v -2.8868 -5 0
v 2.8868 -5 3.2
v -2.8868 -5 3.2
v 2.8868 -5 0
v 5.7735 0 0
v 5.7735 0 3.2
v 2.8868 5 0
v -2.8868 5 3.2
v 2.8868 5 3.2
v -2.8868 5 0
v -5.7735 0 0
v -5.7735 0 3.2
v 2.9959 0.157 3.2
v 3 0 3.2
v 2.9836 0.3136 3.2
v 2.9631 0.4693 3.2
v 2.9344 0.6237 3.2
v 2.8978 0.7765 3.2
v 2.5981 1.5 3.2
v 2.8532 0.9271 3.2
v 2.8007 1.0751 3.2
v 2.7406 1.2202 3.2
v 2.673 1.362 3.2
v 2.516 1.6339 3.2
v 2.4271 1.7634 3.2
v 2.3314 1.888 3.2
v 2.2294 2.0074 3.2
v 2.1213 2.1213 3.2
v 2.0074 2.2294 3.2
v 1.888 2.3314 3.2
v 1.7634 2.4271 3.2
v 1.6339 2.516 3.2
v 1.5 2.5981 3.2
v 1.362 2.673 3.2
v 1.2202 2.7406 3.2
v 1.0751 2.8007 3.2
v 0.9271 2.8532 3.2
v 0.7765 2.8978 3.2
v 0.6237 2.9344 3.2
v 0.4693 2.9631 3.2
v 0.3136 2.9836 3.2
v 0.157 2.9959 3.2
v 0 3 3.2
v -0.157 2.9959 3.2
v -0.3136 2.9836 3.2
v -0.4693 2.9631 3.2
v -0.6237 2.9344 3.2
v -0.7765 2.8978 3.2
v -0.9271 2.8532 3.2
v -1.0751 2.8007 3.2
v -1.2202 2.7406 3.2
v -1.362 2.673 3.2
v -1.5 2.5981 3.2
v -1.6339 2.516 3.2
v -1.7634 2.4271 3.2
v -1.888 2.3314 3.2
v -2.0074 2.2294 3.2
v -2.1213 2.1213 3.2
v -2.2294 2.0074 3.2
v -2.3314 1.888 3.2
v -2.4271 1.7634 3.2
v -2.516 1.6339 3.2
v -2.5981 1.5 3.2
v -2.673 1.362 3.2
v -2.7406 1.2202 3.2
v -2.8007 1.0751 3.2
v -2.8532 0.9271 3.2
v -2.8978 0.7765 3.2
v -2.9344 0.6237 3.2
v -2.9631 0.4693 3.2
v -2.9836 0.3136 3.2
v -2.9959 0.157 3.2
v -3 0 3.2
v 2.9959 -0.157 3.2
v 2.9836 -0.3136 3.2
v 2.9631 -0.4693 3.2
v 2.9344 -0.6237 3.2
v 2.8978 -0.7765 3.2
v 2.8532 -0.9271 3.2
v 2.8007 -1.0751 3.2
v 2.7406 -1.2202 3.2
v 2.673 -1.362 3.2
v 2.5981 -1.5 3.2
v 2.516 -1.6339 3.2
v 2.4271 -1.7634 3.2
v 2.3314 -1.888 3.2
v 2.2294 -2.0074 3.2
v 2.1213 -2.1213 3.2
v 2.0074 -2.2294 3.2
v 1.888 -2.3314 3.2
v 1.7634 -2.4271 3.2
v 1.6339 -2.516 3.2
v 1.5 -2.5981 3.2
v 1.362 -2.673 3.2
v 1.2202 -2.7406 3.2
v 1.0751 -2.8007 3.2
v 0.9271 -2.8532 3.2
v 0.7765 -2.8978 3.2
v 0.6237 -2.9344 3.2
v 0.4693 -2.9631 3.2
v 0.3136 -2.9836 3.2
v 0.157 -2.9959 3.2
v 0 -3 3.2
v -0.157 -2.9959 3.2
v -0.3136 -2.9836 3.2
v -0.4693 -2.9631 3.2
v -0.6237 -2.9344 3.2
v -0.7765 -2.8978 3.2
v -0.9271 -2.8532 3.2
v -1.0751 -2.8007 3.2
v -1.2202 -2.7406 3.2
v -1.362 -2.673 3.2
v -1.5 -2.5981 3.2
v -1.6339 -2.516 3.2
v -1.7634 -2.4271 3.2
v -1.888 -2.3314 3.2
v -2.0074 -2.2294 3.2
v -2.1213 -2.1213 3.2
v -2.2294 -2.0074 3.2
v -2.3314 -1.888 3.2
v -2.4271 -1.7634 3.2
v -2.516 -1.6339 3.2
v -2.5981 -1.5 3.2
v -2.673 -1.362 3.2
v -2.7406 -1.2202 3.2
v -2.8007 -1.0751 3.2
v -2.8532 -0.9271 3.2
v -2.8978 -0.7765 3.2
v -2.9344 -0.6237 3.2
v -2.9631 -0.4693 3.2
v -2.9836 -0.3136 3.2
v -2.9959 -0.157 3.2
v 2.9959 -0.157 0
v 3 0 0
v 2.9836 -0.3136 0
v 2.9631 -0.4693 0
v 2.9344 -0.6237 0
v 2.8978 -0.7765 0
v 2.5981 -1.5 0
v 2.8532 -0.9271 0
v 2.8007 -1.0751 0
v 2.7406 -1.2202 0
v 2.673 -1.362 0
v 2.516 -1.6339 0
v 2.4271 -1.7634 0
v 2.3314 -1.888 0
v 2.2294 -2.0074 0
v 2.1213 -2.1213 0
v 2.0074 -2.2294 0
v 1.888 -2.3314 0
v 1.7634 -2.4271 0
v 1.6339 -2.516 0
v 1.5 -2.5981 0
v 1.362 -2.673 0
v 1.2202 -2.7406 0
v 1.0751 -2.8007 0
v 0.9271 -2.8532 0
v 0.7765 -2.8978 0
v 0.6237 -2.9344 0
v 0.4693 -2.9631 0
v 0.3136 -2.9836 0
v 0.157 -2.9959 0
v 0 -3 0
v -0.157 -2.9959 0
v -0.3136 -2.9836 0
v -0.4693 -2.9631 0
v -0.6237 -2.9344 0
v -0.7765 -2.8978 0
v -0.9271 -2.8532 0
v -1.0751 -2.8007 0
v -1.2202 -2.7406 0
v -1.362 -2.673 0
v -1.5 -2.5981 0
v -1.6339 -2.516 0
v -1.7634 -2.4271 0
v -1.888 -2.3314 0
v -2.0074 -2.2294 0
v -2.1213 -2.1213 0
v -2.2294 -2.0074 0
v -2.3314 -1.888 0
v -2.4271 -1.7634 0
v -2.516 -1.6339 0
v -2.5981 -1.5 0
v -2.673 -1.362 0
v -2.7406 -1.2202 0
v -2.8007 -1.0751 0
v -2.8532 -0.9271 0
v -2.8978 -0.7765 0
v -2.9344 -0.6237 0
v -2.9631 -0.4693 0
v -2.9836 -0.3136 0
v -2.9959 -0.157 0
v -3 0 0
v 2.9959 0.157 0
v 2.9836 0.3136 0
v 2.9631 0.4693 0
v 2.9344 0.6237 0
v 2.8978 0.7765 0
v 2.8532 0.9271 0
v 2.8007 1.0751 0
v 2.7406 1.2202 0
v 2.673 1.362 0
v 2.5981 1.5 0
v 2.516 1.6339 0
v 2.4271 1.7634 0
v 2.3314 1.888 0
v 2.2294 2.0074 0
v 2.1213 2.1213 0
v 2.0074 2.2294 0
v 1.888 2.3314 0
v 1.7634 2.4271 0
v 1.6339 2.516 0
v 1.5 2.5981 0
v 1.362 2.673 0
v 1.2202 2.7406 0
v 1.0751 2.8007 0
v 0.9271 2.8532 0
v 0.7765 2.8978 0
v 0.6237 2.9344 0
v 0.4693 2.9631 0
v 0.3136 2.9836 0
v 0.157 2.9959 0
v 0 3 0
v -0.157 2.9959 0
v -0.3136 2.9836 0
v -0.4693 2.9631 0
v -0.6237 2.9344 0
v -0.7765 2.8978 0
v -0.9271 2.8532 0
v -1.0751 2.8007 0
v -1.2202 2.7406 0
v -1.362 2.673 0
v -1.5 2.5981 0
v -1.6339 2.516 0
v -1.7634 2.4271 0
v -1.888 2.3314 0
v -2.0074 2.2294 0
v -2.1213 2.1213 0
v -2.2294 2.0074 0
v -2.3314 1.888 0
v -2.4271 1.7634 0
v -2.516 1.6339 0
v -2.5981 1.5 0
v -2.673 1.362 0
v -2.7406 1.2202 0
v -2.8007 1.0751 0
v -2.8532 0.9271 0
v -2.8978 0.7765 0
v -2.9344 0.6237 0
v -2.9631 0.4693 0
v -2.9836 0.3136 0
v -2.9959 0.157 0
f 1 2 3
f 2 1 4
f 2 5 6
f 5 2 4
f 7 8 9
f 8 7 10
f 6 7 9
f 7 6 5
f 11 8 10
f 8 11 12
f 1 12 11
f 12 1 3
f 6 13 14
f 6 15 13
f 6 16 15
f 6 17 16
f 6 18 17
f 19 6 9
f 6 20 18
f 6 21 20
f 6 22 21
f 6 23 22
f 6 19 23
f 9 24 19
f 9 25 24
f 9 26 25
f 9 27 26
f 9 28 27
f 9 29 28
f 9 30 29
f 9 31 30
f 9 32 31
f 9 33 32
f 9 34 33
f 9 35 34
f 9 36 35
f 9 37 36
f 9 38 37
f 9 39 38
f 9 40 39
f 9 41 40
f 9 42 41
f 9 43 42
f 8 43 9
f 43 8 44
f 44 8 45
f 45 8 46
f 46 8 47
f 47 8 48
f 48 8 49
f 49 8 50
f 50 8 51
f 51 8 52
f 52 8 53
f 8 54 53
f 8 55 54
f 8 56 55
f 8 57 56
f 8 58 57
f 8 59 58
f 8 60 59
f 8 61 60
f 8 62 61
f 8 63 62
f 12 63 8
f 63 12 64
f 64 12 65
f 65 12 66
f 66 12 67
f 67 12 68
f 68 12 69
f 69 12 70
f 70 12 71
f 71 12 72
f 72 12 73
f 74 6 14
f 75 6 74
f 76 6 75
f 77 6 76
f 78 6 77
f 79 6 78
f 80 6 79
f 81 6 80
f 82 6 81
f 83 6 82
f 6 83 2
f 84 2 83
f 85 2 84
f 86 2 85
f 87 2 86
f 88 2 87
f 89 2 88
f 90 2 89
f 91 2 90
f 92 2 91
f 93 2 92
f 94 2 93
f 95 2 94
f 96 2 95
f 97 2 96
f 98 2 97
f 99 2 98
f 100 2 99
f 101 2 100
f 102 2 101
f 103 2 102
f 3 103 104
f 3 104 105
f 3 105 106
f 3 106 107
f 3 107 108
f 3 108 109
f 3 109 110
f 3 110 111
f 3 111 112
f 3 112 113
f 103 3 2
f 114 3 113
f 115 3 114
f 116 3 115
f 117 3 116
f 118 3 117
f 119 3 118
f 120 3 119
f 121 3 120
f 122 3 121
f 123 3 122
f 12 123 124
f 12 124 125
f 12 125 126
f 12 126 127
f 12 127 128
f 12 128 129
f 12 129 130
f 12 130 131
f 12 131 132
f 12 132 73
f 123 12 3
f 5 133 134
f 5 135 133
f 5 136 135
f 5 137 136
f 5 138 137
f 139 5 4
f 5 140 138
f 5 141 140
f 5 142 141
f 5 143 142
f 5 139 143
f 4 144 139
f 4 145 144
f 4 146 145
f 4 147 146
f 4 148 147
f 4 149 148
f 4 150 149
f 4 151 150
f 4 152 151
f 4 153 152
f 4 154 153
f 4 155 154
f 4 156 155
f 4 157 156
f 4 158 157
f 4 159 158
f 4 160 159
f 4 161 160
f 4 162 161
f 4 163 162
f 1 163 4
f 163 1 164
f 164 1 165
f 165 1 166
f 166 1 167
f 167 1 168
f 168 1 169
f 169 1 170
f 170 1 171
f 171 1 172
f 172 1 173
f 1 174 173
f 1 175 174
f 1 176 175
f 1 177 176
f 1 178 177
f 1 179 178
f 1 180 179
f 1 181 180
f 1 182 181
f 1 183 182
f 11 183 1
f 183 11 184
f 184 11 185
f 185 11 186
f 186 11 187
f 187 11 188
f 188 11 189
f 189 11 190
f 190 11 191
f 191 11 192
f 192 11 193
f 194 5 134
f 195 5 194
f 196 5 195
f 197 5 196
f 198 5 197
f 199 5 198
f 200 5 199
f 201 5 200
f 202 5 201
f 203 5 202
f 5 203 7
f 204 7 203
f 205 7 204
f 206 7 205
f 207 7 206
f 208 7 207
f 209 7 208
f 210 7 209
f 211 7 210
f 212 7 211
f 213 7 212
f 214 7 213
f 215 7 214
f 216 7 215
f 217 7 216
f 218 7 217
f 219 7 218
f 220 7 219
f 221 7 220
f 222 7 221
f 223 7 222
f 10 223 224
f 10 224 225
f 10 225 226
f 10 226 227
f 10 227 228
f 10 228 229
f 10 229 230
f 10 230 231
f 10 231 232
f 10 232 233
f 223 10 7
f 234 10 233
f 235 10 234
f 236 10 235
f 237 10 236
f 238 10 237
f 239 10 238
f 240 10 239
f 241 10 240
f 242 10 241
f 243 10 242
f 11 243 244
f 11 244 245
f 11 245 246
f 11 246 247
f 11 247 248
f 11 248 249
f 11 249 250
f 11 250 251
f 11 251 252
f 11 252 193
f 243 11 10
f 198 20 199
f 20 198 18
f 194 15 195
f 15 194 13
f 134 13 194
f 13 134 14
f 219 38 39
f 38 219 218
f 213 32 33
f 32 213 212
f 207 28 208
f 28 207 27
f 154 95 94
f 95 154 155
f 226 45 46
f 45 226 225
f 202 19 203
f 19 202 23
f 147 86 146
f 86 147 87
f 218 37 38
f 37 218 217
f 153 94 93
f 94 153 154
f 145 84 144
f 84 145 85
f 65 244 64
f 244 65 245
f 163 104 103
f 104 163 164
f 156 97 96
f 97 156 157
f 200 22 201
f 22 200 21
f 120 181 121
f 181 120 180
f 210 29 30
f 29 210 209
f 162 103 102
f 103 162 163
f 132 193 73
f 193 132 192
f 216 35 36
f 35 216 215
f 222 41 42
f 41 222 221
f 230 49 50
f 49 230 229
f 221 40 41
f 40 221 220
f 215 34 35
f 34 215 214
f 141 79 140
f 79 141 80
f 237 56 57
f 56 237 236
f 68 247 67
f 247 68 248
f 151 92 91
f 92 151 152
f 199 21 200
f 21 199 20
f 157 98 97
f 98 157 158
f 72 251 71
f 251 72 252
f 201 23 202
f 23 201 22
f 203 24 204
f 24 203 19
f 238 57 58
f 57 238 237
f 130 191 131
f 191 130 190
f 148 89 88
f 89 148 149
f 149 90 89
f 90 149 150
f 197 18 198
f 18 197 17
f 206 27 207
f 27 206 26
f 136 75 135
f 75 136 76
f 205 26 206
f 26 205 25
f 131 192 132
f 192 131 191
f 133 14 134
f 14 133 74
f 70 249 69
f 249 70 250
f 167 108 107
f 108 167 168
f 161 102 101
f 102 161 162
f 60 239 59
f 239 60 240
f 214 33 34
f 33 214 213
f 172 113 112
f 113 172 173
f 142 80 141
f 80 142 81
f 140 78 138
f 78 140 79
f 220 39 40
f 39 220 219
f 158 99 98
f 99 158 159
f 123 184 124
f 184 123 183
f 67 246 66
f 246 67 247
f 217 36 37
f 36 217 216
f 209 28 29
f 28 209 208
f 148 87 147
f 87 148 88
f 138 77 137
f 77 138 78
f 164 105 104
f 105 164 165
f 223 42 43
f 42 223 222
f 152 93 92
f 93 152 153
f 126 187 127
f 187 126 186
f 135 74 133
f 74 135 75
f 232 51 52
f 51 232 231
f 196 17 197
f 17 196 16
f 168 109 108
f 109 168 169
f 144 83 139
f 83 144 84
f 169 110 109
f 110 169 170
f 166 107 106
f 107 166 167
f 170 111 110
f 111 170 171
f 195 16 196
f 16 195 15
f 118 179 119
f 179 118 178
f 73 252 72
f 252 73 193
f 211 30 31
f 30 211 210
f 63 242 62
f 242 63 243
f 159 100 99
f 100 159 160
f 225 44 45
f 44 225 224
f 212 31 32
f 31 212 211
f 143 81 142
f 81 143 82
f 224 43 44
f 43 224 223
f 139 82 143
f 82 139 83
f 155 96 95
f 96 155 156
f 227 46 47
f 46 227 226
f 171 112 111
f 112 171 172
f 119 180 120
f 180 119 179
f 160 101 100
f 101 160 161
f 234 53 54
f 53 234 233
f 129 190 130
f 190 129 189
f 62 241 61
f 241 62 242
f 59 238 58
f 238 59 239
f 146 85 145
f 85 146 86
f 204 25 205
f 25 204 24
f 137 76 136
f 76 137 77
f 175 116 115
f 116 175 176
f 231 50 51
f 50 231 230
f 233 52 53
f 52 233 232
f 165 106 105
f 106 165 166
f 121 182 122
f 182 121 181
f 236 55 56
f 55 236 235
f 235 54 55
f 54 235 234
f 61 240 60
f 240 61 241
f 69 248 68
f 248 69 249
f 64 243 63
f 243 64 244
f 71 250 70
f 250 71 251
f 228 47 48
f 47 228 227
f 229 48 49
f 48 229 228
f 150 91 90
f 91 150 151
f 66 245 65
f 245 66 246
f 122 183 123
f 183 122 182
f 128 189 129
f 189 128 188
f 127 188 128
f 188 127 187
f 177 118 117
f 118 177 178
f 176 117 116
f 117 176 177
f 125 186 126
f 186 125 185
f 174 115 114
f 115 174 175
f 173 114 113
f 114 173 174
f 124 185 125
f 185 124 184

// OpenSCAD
$fn = 120;

across_flats = 10.0;   // mm
thickness    = 3.2;    // mm
hole_d       = 6.0;    // mm (clearance as specified)

module hex_prism_af(af, h){
    // For a regular hexagon: across_flats = sqrt(3) * circumradius
    r = af / sqrt(3);
    cylinder(h = h, r = r, $fn = 6);
}

difference() {
    hex_prism_af(across_flats, thickness);
    translate([0,0,-0.1])
        cylinder(h = thickness + 0.2, d = hole_d, $fn = 120);
}
